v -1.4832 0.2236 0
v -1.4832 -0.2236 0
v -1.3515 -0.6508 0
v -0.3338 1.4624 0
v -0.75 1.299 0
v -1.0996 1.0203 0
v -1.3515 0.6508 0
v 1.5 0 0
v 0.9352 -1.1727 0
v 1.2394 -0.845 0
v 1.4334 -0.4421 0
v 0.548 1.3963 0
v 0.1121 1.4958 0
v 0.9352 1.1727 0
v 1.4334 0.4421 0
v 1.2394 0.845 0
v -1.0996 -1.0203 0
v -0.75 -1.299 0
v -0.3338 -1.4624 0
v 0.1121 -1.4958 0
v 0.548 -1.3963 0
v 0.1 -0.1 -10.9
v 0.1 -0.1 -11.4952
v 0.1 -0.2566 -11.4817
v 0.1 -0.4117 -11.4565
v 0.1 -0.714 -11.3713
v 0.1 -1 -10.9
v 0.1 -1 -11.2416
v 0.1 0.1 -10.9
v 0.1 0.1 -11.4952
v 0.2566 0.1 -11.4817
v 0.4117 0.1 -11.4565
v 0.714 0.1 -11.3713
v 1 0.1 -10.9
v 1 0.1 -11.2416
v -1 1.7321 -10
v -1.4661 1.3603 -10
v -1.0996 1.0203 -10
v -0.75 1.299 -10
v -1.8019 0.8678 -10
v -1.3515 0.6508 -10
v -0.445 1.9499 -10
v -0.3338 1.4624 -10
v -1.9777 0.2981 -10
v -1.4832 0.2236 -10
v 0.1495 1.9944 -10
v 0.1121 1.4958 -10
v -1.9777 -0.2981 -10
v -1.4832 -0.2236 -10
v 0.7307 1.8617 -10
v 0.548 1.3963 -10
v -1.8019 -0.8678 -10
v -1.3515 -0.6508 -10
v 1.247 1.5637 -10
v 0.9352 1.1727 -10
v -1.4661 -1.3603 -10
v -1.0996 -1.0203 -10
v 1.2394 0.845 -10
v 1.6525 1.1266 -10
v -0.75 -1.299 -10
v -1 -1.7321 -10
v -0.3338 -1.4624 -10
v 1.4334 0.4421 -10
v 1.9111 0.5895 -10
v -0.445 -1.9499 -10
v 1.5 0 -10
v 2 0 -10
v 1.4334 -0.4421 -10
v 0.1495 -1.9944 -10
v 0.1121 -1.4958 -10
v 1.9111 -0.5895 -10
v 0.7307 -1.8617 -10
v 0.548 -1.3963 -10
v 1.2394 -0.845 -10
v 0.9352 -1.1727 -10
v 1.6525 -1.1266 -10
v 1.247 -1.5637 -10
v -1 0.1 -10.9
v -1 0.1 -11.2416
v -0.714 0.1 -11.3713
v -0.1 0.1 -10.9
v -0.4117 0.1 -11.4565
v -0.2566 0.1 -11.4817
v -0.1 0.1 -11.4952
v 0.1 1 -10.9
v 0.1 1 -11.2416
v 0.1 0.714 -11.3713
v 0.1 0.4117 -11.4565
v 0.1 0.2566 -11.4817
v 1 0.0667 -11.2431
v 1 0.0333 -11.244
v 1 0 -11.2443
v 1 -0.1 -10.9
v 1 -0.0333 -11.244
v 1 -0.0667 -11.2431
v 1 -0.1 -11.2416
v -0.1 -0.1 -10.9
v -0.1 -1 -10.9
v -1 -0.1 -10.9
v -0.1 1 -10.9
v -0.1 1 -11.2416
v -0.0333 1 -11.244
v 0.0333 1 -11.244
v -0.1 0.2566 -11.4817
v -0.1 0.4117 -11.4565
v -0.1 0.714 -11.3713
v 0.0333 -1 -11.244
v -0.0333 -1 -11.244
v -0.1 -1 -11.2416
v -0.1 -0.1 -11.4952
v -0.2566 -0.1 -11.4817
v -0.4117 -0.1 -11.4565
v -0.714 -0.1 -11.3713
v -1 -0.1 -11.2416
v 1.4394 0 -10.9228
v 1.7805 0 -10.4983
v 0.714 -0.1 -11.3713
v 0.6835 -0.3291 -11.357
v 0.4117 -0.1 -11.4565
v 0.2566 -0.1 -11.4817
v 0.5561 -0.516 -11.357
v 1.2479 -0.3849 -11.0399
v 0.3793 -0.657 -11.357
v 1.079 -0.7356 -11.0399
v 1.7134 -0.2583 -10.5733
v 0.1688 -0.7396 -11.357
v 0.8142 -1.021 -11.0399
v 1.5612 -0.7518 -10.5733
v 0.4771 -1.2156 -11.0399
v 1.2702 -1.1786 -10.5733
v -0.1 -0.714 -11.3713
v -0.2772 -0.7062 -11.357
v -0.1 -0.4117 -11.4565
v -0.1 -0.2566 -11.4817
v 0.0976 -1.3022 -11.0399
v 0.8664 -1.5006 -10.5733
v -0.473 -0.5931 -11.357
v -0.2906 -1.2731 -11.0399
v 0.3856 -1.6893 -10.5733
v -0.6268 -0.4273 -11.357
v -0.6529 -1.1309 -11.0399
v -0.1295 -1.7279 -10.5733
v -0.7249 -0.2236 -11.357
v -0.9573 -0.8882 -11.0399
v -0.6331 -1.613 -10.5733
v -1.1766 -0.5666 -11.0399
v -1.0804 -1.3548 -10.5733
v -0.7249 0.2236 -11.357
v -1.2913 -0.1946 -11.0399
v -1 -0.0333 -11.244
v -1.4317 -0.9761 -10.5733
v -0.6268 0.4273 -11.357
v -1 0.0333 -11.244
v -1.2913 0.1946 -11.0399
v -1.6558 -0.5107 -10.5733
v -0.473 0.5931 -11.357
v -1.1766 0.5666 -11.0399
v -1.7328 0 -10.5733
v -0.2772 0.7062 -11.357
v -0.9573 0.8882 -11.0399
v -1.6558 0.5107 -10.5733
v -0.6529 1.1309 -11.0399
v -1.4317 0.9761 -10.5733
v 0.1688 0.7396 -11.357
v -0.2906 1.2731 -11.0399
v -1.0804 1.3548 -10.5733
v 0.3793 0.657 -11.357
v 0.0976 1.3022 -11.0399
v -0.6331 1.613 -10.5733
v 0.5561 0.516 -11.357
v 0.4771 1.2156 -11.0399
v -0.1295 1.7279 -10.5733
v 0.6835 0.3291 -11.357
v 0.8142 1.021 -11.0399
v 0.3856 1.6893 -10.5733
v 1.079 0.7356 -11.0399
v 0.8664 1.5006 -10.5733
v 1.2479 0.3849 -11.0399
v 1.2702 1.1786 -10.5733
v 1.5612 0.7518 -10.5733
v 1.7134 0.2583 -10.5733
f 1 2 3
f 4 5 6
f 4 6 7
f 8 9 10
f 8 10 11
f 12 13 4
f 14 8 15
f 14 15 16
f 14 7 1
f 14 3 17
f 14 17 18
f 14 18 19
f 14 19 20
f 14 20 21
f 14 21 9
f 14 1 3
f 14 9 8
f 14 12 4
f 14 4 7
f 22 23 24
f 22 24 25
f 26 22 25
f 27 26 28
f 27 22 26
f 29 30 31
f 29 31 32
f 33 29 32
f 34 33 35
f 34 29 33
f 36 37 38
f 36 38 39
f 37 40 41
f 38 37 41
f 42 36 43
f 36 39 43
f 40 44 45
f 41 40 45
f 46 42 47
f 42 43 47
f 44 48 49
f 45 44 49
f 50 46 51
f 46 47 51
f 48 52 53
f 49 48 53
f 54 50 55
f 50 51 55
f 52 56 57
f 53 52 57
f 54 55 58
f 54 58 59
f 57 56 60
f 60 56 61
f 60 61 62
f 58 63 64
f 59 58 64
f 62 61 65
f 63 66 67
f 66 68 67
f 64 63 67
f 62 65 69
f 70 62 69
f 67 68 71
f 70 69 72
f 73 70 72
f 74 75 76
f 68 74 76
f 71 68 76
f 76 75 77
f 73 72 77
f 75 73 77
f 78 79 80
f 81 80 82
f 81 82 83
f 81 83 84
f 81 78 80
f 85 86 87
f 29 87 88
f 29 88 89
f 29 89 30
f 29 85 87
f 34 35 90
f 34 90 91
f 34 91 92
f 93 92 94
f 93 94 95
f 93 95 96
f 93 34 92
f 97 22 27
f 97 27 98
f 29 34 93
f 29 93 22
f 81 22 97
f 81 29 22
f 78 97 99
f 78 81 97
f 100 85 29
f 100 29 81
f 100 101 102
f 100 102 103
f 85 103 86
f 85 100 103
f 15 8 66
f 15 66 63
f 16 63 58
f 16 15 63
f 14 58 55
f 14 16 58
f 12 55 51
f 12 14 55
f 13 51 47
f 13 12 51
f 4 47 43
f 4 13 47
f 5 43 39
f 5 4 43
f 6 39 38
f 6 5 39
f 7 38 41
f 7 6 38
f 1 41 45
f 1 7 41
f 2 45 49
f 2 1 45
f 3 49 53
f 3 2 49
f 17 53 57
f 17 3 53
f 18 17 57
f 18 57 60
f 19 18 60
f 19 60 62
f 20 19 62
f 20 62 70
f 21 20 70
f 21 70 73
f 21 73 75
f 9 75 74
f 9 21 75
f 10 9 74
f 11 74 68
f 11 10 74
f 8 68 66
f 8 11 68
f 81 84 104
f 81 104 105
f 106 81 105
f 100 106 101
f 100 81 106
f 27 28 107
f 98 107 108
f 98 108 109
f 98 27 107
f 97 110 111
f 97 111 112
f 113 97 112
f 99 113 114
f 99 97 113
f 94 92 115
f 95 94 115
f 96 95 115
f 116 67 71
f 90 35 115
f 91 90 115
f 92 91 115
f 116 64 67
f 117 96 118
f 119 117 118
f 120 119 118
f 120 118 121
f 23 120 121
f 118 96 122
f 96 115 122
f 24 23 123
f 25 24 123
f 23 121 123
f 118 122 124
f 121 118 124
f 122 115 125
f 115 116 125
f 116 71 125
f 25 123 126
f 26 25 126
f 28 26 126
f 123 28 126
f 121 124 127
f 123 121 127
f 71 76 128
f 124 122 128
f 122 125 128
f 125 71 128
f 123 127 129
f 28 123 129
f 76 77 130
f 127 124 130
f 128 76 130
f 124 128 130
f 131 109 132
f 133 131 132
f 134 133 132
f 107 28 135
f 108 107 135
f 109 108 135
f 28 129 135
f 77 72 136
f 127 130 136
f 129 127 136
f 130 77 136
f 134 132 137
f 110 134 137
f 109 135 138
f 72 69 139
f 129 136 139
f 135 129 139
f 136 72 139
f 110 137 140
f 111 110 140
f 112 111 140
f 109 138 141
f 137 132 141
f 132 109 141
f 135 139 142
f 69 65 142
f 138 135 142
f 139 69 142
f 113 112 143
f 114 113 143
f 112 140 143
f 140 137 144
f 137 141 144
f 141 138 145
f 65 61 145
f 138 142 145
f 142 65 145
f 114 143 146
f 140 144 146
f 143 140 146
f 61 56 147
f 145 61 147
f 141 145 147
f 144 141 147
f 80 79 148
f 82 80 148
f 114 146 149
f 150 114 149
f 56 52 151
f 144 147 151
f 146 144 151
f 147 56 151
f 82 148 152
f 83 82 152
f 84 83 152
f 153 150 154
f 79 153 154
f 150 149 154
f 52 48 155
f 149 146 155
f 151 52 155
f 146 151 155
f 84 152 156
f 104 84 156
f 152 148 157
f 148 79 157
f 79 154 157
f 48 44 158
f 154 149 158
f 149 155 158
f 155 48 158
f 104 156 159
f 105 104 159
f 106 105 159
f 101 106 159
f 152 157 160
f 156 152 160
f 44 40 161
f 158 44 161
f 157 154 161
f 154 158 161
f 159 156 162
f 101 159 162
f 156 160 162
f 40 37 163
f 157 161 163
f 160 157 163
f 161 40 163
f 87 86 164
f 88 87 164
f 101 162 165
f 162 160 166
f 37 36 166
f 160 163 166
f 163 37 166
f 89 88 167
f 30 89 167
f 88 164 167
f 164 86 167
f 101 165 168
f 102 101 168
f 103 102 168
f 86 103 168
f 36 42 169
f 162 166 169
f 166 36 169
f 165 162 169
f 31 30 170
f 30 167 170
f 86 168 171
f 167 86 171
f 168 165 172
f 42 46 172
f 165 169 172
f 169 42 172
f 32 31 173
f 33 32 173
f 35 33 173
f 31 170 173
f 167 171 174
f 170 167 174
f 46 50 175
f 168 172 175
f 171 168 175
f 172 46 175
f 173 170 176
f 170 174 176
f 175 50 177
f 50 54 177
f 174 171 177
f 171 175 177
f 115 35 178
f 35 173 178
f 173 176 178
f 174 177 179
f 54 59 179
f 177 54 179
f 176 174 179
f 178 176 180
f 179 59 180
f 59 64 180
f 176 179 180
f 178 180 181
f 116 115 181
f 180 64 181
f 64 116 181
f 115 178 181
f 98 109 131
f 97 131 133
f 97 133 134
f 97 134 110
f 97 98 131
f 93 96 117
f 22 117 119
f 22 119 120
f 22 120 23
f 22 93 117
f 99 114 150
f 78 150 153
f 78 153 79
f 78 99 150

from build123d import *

# Parameters (mm, degrees)
CROQUIS2_R                   = 1.5
SALIENTE_EXTRUIR1_DEPTH      = 10
CORTAR_EXTRUIR_L_MINA2_START = -0.6
CORTAR_EXTRUIR_L_MINA2_DEPTH = 0.6


# Read off the part's stored shape, not the designer's step: Cortar-Extruir-Lámina2
with BuildPart() as part:
    # Croquis2 → Saliente-Extruir1 (new body)
    with BuildSketch(Plane.XY):
        Circle(CROQUIS2_R)
    extrude(amount=-SALIENTE_EXTRUIR1_DEPTH)

    # Croquis4 → Revolución1 (revolve)
    with BuildSketch(Plane(origin=(0, 0, 0), x_dir=(1, 0, 0), z_dir=(0, 1, 0))):
        with BuildLine():
            Line((2, 10), (0, 10))
            Line((0, 10), (0, 11.5))
            ThreePointArc((0, 11.5), (1.25, 11.083333333), (2, 10))
        make_face()
    revolve(axis=Axis((0, 0, -10), (0, 0, -1)))

    # Cortar-Extruir-Lámina2 outline → Cortar-Extruir-Lámina2 (cut)
    with BuildSketch(Plane(origin=(0, 0, -11.5), x_dir=(-1, 0, 0), z_dir=(0, 0, -1)).offset(CORTAR_EXTRUIR_L_MINA2_START)):
        Polygon((0.1, -1), (0.1, -0.1), (1, -0.1), (1, 0.1), (0.1, 0.1), (0.1, 1), (-0.1, 1), (-0.1, 0.1), (-1, 0.1), (-1, -0.1), (-0.1, -0.1), (-0.1, -1), align=None)
    extrude(amount=CORTAR_EXTRUIR_L_MINA2_DEPTH, mode=Mode.SUBTRACT)


solid = part.part
